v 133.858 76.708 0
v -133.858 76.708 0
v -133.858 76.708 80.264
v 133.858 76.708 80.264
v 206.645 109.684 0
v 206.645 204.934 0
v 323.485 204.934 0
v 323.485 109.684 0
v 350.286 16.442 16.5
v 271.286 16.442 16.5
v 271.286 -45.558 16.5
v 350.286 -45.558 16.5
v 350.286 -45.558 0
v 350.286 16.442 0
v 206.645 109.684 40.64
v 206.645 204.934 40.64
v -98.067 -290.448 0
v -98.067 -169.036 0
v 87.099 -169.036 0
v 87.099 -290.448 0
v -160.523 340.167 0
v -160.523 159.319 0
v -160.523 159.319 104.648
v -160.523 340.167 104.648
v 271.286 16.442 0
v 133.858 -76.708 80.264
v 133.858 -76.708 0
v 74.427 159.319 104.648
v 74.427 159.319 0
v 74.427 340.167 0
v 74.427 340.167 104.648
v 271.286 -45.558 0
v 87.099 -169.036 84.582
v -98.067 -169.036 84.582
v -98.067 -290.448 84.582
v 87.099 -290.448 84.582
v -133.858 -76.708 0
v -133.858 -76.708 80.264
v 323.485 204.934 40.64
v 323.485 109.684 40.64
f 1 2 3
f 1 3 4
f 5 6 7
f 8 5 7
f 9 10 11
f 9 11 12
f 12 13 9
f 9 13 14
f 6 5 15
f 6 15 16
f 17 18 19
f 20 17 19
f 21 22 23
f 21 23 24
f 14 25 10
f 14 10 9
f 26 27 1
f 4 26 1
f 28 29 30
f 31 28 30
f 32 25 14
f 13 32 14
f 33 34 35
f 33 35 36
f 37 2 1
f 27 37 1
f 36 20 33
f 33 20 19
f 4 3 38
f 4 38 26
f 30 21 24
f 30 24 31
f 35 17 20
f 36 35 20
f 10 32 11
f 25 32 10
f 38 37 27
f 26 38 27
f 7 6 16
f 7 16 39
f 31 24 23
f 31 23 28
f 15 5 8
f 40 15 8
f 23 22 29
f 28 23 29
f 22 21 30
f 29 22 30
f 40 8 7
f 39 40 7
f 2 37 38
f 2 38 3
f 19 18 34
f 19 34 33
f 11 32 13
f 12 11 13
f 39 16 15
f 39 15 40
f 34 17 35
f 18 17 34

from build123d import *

# Parameters (mm, degrees)
F0_W     = 267.716
F0_H     = 153.416
F1_DEPTH = 80.264
F2_W     = 185.166
F2_H     = 121.412
F3_DEPTH = 84.582
F4_W     = 234.95
F4_H     = 180.848
F5_DEPTH = 104.648
F6_W     = 79
F6_H     = 62
F7_DEPTH = 16.5
F8_W     = 116.84
F8_H     = 95.25
F9_DEPTH = 40.64


with BuildPart() as f1:
    # F0 (on Top) → F1 (new body)
    with BuildSketch(Plane.XY):
        Rectangle(F0_W, F0_H)
    extrude(amount=F1_DEPTH)


with BuildPart() as f3:
    # F2 (on Top) → F3 (new body)
    with BuildSketch(Plane.XY):
        with Locations((-5.48432, -229.742248)):
            Rectangle(F2_W, F2_H)
    extrude(amount=F3_DEPTH)


with BuildPart() as f5:
    # F4 (on Top) → F5 (new body)
    with BuildSketch(Plane.XY):
        with Locations((-43.0484, 249.742784)):
            Rectangle(F4_W, F4_H)
    extrude(amount=F5_DEPTH)


with BuildPart() as f7:
    # F6 (on Top) → F7 (new body)
    with BuildSketch(Plane.XY):
        with Locations((310.785981, -14.557968)):
            Rectangle(F6_W, F6_H)
    extrude(amount=F7_DEPTH)


with BuildPart() as f9:
    # F8 (on Top) → F9 (new body)
    with BuildSketch(Plane.XY):
        with Locations((265.065399, 157.308737)):
            Rectangle(F8_W, F8_H)
    extrude(amount=F9_DEPTH)


solid = Compound([f1.part, f3.part, f5.part, f7.part, f9.part])
